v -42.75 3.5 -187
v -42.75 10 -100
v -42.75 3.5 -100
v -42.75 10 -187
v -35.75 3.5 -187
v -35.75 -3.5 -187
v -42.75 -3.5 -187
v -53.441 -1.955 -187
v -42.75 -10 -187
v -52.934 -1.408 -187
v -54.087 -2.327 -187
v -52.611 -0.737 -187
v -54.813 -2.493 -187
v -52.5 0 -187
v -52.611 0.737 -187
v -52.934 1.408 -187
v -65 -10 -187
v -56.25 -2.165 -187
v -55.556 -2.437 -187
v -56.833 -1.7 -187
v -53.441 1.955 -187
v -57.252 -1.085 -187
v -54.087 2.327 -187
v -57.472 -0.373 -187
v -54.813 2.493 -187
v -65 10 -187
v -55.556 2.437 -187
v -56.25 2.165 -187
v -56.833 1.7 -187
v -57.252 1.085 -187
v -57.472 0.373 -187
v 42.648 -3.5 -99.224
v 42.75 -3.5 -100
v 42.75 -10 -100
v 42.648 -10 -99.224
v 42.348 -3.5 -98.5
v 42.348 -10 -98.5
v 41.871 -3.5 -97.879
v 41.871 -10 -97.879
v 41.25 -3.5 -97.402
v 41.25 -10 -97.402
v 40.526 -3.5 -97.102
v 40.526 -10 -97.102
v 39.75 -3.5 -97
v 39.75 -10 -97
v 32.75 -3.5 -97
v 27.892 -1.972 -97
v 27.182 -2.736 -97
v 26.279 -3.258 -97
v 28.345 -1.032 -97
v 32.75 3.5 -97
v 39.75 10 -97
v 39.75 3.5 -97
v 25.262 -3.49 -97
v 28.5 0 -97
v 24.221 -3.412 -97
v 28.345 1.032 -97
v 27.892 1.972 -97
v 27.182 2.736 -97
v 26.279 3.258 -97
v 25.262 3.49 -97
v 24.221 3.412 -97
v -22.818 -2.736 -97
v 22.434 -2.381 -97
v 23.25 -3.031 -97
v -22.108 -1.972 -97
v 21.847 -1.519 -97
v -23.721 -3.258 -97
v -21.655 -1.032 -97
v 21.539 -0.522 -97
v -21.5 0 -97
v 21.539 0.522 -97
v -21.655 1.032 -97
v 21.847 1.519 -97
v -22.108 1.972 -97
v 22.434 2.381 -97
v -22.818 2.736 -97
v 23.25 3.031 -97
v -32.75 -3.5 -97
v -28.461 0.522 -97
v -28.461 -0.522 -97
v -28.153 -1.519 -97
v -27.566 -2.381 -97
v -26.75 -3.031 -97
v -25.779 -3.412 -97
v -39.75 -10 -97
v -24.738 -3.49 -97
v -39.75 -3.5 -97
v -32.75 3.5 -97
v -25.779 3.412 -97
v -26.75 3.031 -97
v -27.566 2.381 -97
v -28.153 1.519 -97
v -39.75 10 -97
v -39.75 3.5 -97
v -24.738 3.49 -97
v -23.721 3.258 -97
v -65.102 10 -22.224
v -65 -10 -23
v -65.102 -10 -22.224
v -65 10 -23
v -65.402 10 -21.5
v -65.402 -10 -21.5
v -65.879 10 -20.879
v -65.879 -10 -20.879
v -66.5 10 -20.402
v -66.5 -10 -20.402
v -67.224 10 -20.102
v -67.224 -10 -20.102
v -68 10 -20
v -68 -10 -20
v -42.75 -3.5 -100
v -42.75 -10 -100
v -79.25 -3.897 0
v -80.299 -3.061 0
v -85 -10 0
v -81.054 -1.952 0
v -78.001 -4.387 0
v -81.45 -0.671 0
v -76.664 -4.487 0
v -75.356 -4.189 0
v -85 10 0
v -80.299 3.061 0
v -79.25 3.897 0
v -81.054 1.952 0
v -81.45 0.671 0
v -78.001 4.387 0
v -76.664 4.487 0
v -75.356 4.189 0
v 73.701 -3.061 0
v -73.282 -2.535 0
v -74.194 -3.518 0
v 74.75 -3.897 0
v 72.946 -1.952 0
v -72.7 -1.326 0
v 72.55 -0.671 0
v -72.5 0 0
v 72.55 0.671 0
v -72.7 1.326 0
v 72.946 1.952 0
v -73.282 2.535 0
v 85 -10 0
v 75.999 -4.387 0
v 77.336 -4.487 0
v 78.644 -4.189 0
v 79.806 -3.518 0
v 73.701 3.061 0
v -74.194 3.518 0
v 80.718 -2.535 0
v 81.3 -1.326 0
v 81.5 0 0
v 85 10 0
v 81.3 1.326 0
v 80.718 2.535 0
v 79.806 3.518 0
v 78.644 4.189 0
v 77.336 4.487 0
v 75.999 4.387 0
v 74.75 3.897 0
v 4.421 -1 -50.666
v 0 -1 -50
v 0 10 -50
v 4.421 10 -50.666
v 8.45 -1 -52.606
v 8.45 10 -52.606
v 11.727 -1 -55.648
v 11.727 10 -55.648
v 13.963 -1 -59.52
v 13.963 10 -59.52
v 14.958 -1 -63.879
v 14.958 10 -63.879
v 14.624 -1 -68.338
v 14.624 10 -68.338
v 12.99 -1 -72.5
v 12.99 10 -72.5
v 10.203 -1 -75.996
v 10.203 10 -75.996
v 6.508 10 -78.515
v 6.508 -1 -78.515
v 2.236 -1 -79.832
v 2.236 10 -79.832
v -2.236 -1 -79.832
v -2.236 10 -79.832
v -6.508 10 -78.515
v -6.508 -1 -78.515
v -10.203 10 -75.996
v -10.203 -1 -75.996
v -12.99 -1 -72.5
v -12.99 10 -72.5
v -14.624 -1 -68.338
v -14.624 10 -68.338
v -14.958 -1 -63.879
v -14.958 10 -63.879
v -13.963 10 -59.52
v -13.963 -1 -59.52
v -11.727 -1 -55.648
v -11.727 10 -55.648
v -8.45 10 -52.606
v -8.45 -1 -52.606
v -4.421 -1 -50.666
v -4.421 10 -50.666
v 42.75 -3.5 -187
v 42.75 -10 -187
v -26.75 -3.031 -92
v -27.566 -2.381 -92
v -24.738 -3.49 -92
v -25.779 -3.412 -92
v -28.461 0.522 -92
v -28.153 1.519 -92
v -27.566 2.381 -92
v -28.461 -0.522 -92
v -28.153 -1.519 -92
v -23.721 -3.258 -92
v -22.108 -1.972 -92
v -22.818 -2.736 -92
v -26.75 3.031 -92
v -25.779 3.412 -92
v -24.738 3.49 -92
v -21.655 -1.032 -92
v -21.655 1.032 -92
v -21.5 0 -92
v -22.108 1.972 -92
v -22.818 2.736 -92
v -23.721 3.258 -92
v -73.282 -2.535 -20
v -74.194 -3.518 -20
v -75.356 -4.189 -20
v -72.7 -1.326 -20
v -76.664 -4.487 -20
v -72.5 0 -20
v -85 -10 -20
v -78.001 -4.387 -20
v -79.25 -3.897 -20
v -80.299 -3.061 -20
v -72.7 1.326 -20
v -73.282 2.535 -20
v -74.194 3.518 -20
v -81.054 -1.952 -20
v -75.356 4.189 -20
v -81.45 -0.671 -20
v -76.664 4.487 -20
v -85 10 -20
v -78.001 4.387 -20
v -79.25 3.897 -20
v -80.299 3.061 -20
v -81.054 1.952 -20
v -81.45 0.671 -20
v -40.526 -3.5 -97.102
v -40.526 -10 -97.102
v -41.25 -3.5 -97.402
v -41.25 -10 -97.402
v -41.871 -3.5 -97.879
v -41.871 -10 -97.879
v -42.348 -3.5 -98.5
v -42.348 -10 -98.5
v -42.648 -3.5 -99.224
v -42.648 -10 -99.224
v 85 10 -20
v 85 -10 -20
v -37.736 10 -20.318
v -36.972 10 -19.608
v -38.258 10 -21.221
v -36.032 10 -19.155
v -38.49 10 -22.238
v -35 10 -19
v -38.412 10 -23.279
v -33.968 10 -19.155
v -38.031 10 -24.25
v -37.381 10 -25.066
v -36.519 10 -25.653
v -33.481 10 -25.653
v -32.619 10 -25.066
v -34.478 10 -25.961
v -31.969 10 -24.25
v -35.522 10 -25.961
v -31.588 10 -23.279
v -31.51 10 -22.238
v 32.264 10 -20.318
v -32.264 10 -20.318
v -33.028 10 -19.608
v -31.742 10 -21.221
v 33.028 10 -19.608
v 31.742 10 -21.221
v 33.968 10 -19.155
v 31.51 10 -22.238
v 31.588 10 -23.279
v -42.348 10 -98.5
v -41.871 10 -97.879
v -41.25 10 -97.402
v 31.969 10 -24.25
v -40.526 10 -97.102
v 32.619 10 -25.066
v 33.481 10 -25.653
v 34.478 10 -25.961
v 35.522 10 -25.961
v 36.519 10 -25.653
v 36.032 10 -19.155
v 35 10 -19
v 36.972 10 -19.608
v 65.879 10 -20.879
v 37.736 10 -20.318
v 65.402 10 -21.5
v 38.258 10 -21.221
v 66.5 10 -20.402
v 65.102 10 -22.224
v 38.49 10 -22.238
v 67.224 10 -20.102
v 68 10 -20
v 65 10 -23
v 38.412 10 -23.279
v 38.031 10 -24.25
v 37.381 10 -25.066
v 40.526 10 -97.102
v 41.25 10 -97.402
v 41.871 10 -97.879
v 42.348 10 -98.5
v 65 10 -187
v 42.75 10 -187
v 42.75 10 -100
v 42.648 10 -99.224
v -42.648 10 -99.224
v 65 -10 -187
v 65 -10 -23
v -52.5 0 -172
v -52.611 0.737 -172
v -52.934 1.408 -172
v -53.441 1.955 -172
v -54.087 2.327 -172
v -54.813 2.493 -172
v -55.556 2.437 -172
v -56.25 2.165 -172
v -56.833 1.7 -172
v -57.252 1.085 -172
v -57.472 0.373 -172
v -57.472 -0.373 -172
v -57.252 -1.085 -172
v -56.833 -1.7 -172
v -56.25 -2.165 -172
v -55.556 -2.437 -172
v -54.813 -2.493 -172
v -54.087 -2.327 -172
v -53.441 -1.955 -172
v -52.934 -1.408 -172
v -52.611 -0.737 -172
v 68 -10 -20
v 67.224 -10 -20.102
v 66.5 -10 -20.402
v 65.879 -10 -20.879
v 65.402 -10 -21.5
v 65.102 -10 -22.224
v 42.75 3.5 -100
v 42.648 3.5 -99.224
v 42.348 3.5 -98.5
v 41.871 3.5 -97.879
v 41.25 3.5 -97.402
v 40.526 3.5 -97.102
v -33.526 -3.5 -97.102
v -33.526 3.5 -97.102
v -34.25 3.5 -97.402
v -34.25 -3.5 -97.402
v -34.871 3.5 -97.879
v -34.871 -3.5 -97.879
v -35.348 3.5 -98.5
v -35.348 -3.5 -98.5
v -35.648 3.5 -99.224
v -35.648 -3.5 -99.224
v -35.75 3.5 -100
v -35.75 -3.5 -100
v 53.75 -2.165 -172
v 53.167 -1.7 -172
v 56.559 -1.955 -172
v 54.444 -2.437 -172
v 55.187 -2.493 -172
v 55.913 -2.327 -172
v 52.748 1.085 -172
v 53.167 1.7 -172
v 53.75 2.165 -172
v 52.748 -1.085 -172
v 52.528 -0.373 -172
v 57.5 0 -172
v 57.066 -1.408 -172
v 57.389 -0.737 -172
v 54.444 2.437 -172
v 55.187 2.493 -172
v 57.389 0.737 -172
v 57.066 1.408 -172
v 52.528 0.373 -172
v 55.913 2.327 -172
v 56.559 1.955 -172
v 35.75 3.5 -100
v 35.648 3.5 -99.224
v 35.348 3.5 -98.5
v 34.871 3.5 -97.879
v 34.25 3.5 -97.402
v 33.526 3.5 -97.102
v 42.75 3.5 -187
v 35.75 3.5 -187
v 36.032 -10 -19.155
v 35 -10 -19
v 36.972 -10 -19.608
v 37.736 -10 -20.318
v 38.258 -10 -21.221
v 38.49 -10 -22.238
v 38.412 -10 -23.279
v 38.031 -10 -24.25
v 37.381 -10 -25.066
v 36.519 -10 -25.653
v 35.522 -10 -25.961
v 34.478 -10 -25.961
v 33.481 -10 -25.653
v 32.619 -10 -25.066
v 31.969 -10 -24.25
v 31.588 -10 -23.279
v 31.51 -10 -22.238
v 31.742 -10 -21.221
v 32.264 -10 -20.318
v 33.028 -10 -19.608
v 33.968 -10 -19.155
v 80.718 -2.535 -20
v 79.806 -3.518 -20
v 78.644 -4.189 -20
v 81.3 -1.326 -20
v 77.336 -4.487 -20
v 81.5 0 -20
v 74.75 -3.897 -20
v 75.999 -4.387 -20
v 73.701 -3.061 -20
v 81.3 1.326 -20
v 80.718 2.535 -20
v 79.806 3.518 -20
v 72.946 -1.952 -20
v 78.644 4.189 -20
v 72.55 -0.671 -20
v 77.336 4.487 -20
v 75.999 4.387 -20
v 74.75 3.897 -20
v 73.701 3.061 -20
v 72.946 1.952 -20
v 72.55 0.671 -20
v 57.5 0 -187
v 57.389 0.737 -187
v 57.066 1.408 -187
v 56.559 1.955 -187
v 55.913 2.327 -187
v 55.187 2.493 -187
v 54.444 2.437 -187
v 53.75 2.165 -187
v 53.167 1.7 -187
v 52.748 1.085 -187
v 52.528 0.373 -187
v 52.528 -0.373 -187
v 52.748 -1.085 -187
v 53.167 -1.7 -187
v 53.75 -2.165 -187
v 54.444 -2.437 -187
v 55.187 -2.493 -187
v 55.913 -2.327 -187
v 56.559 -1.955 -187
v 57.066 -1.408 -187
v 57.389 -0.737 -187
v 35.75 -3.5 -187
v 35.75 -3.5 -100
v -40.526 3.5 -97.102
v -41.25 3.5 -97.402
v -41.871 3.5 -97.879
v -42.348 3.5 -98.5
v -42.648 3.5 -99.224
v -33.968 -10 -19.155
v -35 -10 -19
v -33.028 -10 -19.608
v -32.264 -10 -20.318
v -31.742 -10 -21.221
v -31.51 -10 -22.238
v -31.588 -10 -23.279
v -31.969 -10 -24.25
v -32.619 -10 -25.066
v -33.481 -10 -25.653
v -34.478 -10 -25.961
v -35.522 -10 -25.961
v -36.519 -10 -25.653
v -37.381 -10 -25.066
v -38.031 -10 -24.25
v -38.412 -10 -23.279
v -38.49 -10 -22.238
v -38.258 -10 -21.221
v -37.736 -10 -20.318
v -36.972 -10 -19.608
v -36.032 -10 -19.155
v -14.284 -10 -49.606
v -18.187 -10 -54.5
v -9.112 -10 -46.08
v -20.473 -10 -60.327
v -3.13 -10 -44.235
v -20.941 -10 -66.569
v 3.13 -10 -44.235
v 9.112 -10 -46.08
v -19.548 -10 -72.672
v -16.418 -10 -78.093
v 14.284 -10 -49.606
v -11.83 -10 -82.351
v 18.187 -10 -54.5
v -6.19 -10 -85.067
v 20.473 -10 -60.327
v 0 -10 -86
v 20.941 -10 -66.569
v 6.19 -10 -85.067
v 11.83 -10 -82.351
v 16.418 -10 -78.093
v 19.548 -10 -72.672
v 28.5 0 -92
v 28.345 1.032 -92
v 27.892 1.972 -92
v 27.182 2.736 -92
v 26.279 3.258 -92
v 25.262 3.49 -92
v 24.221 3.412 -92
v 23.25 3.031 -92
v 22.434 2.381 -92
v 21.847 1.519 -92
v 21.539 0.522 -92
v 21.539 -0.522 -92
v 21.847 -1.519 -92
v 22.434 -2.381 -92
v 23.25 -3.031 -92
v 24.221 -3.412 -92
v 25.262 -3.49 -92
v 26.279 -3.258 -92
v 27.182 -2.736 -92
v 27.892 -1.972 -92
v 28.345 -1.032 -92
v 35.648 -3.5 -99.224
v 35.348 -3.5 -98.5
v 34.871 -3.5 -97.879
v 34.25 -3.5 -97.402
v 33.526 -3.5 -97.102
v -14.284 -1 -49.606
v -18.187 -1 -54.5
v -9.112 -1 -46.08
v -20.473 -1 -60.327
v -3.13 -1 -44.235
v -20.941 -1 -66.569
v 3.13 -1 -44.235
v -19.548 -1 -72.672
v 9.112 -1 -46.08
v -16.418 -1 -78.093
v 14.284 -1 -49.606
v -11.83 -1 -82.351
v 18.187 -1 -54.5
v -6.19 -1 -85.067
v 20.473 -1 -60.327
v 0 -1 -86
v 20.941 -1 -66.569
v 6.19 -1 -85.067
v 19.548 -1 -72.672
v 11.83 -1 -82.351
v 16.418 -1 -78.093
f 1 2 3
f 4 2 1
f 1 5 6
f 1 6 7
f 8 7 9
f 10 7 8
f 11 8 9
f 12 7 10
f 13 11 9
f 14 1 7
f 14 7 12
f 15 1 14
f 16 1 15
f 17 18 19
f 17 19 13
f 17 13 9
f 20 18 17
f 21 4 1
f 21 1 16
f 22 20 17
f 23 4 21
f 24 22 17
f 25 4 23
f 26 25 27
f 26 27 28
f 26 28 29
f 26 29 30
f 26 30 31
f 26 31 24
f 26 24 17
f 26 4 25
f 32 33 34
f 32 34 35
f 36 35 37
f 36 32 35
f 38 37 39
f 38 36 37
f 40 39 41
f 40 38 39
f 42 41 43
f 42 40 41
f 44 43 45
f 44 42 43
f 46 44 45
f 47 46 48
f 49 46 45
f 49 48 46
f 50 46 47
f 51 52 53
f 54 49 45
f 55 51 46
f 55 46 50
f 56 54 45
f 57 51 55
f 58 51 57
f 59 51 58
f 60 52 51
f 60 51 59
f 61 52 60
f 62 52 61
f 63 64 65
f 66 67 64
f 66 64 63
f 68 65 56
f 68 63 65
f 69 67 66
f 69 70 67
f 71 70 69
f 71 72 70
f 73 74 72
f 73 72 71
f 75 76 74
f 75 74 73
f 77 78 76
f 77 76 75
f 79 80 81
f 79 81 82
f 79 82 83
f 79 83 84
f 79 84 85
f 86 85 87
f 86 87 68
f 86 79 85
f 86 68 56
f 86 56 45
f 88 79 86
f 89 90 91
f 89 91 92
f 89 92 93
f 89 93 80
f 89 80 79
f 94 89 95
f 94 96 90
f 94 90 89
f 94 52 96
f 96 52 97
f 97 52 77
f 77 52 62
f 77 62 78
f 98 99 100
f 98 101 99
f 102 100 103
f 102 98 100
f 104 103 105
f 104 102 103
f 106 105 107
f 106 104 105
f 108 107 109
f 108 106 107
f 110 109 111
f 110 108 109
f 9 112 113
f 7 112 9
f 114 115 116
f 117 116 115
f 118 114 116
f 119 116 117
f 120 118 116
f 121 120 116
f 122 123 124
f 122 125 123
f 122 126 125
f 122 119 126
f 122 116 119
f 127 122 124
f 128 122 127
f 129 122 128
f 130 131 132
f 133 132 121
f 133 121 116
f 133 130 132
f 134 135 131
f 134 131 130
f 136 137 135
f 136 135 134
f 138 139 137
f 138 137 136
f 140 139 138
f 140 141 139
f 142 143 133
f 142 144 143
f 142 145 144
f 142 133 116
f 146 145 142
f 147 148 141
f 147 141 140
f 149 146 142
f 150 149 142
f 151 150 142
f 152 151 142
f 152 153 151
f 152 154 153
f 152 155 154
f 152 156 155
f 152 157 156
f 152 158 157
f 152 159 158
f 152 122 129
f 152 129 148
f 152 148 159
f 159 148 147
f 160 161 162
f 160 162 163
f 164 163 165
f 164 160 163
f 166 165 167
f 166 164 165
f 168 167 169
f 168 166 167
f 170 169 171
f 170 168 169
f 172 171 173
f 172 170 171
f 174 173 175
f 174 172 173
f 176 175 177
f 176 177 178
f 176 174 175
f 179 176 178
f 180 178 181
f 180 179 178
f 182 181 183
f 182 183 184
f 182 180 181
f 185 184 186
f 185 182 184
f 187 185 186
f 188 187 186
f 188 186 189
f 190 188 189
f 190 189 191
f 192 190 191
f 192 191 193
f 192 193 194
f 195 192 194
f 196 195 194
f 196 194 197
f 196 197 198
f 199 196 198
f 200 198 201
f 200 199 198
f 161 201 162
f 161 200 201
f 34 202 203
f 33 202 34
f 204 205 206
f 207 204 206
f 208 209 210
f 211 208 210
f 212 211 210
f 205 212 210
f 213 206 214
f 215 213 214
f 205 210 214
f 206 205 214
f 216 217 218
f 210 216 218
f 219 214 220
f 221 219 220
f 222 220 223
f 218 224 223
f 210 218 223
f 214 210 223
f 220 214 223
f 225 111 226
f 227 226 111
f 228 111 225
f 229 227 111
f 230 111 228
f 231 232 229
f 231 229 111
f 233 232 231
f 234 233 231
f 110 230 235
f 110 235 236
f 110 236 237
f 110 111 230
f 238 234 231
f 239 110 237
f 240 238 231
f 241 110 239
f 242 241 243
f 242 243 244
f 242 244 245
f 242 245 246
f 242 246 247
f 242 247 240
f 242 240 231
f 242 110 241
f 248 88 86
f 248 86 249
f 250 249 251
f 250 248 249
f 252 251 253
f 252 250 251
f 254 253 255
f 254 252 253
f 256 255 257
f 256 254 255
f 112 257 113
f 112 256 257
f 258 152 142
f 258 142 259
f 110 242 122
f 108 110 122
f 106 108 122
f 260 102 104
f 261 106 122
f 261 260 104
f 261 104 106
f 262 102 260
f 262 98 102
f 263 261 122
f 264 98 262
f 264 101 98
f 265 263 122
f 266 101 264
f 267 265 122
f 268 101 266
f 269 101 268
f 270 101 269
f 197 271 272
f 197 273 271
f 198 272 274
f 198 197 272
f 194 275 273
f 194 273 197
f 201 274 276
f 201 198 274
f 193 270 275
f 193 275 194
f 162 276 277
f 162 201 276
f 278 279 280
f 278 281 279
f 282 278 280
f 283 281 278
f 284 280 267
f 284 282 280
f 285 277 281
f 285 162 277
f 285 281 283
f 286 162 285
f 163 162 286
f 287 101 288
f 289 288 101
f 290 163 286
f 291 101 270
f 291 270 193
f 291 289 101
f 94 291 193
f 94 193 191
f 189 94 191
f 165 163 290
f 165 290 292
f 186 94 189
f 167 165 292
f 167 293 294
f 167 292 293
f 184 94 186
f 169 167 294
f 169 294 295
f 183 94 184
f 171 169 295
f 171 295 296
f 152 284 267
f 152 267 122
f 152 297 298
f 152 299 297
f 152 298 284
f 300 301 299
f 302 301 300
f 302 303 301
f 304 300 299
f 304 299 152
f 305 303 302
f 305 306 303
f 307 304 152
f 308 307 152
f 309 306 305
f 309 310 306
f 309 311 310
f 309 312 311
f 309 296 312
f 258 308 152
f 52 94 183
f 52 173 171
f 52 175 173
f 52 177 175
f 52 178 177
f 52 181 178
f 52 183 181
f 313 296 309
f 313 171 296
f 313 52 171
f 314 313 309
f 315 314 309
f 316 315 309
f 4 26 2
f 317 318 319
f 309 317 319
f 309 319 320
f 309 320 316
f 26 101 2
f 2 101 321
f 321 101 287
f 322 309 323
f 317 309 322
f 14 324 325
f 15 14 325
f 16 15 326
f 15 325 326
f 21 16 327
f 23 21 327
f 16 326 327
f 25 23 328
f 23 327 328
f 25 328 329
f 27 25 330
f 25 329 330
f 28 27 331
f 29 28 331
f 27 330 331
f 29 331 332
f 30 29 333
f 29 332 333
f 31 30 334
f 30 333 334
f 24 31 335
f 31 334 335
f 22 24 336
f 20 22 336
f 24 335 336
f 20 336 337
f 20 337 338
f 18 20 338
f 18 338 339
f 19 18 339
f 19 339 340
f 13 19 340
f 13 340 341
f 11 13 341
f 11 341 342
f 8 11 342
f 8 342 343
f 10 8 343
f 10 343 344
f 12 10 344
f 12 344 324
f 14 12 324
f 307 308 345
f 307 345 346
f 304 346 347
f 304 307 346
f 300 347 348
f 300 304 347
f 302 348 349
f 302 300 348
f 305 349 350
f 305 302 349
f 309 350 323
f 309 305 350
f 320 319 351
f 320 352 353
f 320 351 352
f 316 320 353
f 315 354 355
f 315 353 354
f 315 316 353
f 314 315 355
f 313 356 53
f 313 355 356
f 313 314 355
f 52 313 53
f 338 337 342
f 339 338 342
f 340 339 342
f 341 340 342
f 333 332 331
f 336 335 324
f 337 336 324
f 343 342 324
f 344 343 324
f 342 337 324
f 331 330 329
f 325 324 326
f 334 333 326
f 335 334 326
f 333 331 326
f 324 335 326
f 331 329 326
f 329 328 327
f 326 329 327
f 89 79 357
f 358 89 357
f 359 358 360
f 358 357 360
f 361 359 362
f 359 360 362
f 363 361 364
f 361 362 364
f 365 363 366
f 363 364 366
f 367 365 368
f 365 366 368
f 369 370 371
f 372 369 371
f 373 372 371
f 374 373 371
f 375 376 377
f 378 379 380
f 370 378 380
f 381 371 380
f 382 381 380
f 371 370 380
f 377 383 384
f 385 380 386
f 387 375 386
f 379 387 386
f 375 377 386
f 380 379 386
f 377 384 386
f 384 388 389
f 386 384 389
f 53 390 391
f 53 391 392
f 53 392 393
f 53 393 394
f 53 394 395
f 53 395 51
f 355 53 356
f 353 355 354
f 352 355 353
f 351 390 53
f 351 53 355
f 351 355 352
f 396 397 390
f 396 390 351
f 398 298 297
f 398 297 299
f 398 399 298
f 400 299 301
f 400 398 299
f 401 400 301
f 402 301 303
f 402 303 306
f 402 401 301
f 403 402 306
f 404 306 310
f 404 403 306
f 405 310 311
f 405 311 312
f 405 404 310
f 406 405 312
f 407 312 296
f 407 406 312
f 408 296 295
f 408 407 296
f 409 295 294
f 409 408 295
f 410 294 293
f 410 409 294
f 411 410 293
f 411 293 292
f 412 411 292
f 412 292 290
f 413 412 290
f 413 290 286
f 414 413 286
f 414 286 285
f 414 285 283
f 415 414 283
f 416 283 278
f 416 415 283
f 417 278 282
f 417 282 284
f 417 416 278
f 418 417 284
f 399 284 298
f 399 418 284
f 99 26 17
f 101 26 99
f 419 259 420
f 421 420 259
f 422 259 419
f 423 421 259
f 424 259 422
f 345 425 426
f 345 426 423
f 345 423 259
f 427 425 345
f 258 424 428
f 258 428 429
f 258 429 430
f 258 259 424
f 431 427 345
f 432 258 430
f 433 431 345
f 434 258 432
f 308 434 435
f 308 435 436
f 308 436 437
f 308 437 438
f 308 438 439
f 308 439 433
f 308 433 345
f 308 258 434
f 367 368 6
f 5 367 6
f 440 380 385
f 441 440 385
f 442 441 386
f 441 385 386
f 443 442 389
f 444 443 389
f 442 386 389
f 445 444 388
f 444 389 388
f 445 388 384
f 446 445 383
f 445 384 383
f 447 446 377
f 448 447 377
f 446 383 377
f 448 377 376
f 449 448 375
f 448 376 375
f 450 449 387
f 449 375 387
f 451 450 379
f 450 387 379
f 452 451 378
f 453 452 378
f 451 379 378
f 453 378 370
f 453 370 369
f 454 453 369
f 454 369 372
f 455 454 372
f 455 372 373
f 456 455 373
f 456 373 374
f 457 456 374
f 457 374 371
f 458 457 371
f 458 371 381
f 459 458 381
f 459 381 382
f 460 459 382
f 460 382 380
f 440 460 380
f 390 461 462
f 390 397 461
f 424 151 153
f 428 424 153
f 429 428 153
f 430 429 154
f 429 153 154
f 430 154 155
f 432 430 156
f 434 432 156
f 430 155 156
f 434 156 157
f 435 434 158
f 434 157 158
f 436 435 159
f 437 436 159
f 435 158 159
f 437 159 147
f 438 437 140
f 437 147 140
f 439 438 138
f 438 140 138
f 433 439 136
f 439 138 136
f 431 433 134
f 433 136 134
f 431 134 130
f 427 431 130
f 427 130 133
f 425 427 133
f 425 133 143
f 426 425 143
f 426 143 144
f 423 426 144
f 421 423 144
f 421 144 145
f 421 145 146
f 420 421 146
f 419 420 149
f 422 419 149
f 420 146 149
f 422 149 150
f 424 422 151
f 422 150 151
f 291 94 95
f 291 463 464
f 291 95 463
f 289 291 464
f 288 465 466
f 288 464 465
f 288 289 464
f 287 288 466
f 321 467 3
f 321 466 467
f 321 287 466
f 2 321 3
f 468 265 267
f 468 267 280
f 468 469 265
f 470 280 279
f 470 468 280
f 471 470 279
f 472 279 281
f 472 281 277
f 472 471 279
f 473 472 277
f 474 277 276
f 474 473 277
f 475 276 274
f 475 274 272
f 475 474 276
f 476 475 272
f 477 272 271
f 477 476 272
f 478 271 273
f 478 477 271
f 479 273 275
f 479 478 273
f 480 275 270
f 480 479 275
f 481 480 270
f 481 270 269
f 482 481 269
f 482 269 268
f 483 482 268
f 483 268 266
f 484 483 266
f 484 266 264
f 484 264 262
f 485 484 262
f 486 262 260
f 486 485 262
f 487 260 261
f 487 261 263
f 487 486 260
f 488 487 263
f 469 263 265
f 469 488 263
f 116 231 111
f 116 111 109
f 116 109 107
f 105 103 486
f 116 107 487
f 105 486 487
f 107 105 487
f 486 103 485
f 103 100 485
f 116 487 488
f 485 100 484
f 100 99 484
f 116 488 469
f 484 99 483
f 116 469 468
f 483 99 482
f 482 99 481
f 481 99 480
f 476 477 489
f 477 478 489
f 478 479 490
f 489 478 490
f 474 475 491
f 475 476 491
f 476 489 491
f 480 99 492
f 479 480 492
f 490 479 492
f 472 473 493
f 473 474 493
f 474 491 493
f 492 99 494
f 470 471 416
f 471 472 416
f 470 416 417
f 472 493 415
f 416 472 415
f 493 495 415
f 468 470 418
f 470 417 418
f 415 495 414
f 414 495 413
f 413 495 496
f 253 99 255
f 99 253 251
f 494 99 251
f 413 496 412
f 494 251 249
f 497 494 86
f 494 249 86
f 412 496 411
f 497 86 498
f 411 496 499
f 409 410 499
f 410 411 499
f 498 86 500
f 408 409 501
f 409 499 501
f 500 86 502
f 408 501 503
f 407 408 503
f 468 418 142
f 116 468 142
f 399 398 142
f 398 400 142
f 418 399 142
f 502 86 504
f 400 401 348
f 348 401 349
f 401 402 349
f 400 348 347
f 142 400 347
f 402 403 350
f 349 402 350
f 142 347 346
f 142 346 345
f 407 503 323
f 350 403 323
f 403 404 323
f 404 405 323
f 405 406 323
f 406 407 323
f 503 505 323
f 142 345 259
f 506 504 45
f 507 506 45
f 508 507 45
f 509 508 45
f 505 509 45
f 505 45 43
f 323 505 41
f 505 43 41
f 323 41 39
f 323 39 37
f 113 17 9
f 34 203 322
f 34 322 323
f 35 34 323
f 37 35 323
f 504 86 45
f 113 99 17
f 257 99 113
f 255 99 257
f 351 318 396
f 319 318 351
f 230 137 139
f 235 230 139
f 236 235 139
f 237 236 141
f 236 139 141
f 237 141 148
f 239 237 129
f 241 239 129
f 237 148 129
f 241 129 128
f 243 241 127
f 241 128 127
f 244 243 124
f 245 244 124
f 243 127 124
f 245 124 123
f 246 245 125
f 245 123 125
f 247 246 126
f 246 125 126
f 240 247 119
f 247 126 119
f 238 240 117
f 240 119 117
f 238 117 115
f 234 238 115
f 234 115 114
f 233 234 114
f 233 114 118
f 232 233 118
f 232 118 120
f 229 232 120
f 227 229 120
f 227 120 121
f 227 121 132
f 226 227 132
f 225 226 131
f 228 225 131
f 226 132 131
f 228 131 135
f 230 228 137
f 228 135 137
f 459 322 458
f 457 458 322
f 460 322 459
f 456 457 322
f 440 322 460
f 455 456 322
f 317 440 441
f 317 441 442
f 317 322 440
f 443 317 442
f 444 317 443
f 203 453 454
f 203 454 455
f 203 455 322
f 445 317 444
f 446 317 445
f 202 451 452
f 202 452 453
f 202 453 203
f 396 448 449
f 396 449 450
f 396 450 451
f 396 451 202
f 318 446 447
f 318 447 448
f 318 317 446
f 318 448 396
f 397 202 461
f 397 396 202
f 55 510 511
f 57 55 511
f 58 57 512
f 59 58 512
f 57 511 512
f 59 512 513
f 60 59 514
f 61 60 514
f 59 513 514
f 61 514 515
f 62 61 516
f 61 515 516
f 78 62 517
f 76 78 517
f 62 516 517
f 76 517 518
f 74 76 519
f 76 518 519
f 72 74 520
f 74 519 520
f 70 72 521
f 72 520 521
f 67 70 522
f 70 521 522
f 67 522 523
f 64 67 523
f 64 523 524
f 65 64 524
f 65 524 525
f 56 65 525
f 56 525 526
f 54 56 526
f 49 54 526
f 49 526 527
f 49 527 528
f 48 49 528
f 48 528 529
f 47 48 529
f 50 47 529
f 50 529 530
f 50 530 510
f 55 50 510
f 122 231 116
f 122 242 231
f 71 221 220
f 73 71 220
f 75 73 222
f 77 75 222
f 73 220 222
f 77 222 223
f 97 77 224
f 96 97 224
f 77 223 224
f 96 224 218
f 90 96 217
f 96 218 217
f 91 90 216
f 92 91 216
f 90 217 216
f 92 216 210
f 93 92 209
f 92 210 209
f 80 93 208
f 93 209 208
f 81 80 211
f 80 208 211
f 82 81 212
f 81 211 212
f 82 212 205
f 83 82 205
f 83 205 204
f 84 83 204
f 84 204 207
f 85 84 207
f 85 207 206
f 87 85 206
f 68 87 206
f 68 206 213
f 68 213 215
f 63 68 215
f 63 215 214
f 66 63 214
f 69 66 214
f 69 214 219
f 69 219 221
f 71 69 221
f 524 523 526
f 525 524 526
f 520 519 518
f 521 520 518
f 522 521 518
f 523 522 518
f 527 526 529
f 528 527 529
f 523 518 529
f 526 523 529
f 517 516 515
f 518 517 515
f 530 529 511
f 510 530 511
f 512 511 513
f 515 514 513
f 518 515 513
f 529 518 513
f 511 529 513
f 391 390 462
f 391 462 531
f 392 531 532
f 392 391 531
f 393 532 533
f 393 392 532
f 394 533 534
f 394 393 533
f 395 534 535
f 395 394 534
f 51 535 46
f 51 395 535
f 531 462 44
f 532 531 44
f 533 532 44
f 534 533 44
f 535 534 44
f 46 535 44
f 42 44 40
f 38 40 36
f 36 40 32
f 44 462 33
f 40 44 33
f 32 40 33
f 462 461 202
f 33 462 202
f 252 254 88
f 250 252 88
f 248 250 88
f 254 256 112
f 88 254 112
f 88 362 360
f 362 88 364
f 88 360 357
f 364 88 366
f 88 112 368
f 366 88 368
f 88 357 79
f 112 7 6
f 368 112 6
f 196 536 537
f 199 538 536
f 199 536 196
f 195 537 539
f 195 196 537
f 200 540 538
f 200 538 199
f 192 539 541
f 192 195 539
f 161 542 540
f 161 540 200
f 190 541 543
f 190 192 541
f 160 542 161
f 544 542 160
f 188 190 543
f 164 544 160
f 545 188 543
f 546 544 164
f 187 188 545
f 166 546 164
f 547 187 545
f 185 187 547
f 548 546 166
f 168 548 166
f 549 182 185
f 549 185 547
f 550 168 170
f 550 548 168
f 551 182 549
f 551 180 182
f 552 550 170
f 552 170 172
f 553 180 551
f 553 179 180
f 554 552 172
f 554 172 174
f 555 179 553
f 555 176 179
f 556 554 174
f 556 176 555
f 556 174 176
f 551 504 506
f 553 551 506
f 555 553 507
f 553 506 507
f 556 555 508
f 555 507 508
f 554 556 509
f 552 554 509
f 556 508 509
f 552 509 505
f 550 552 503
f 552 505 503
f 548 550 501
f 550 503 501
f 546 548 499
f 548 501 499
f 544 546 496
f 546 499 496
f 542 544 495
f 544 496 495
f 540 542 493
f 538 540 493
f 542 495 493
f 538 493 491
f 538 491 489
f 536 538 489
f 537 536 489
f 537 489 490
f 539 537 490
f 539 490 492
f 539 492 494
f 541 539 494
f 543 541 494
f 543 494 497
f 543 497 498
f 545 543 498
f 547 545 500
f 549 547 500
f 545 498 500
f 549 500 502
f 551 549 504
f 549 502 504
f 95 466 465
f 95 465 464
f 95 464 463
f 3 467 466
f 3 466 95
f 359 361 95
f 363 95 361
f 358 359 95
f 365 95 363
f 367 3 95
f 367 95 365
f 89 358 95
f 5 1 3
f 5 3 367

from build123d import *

# Parameters (mm, degrees)
SKETCH1_R                 = 3.5
SKETCH1_R_2               = 15
BOSS_EXTRUDE1_DEPTH       = 10
BOSS_EXTRUDE2_DEPTH       = 3.5
SKETCH2_R                 = 21
CUT_EXTRUDE1_DEPTH        = 9
F_1_0MM_DOWEL_HOLE1_D     = 7
F_1_0MM_DOWEL_HOLE1_DEPTH = 5
SKETCH6_R                 = 4.5
CUT_EXTRUDE2_DEPTH        = 20
M6_TAPPED_HOLE1_D         = 5
M6_TAPPED_HOLE1_DEPTH     = 15
M6_TAPPED_HOLE2_D         = 5
M6_TAPPED_HOLE2_DEPTH     = 15


with BuildPart() as part:
    # Sketch1 → Boss-Extrude1 (new, symmetric)
    with BuildSketch(Plane(origin=(0, 0, 0), x_dir=(1, 0, 0), z_dir=(0, 1, 0))):
        with BuildLine():
            Line((-85, 20), (-85, 0))
            Line((-85, 0), (85, 0))
            Line((85, 0), (85, 20))
            Line((85, 20), (68, 20))
            ThreePointArc((68, 20), (65.878679656, 20.878679656), (65, 23))
            Line((65, 23), (65, 187))
            Line((65, 187), (42.75, 187))
            Line((42.75, 187), (42.75, 100))
            ThreePointArc((42.75, 100), (41.871320344, 97.878679656), (39.75, 97))
            Line((39.75, 97), (32.75, 97))
            Line((32.75, 97), (-32.75, 97))
            Line((-32.75, 97), (-39.75, 97))
            ThreePointArc((-39.75, 97), (-41.871320344, 97.878679656), (-42.75, 100))
            Line((-42.75, 100), (-42.75, 187))
            Line((-42.75, 187), (-65, 187))
            Line((-65, 187), (-65, 23))
            ThreePointArc((-65, 23), (-65.878679656, 20.878679656), (-68, 20))
            Line((-68, 20), (-85, 20))
        make_face()
        with Locations((-35, 22.5)):
            Circle(SKETCH1_R, mode=Mode.SUBTRACT)
        with Locations((35, 22.5)):
            Circle(SKETCH1_R, mode=Mode.SUBTRACT)
        with Locations((0, 65)):
            Circle(SKETCH1_R_2, mode=Mode.SUBTRACT)
    extrude(amount=BOSS_EXTRUDE1_DEPTH, both=True)

    # Sketch1<4> → Boss-Extrude2 (add, symmetric)
    with BuildSketch(Plane(origin=(0, 0, 0), x_dir=(1, 0, 0), z_dir=(0, 1, 0))):
        with BuildLine():
            Line((-35.75, 187), (-42.75, 187))
            Line((-42.75, 187), (-42.75, 100))
            ThreePointArc((-42.75, 100), (-41.871320344, 97.878679656), (-39.75, 97))
            Line((-39.75, 97), (-32.75, 97))
            ThreePointArc((-32.75, 97), (-34.871320344, 97.878679656), (-35.75, 100))
            Line((-35.75, 100), (-35.75, 187))
        make_face()
        with BuildLine():
            Line((42.75, 100), (42.75, 187))
            Line((42.75, 187), (35.75, 187))
            Line((35.75, 187), (35.75, 100))
            ThreePointArc((35.75, 100), (34.871320344, 97.878679656), (32.75, 97))
            Line((32.75, 97), (39.75, 97))
            ThreePointArc((39.75, 97), (41.871320344, 97.878679656), (42.75, 100))
        make_face()
    extrude(amount=BOSS_EXTRUDE2_DEPTH, both=True)

    # Sketch2 → Cut-Extrude1 (cut)
    with BuildSketch(Plane.XZ.offset(10)):
        with Locations((0, -65)):
            Circle(SKETCH2_R)
    extrude(amount=-CUT_EXTRUDE1_DEPTH, mode=Mode.SUBTRACT)

    # Ø1.0mm Dowel Hole1
    with Locations(Plane(origin=(0, 0, -97), x_dir=(-1, 0, 0), z_dir=(0, 0, -1))):
        with Locations((-25, 0), (25, 0)):
            Hole(F_1_0MM_DOWEL_HOLE1_D / 2, depth=F_1_0MM_DOWEL_HOLE1_DEPTH)

    # Sketch6 → Cut-Extrude2 (cut)
    with BuildSketch(Plane.XY):
        with Locations((77, 0)):
            Circle(SKETCH6_R)
        with Locations((-77, 0)):
            Circle(SKETCH6_R)
    extrude(amount=-CUT_EXTRUDE2_DEPTH, mode=Mode.SUBTRACT)

    # M6 Tapped Hole1
    with Locations(Plane(origin=(0, 0, -187), x_dir=(-1, 0, 0), z_dir=(0, 0, -1))):
        with Locations((55, 0)):
            Hole(M6_TAPPED_HOLE1_D / 2, depth=M6_TAPPED_HOLE1_DEPTH)

    # M6 Tapped Hole2
    with Locations(Plane(origin=(0, 0, -187), x_dir=(-1, 0, 0), z_dir=(0, 0, -1))):
        with Locations((-55, 0)):
            Hole(M6_TAPPED_HOLE2_D / 2, depth=M6_TAPPED_HOLE2_DEPTH)


solid = part.part
